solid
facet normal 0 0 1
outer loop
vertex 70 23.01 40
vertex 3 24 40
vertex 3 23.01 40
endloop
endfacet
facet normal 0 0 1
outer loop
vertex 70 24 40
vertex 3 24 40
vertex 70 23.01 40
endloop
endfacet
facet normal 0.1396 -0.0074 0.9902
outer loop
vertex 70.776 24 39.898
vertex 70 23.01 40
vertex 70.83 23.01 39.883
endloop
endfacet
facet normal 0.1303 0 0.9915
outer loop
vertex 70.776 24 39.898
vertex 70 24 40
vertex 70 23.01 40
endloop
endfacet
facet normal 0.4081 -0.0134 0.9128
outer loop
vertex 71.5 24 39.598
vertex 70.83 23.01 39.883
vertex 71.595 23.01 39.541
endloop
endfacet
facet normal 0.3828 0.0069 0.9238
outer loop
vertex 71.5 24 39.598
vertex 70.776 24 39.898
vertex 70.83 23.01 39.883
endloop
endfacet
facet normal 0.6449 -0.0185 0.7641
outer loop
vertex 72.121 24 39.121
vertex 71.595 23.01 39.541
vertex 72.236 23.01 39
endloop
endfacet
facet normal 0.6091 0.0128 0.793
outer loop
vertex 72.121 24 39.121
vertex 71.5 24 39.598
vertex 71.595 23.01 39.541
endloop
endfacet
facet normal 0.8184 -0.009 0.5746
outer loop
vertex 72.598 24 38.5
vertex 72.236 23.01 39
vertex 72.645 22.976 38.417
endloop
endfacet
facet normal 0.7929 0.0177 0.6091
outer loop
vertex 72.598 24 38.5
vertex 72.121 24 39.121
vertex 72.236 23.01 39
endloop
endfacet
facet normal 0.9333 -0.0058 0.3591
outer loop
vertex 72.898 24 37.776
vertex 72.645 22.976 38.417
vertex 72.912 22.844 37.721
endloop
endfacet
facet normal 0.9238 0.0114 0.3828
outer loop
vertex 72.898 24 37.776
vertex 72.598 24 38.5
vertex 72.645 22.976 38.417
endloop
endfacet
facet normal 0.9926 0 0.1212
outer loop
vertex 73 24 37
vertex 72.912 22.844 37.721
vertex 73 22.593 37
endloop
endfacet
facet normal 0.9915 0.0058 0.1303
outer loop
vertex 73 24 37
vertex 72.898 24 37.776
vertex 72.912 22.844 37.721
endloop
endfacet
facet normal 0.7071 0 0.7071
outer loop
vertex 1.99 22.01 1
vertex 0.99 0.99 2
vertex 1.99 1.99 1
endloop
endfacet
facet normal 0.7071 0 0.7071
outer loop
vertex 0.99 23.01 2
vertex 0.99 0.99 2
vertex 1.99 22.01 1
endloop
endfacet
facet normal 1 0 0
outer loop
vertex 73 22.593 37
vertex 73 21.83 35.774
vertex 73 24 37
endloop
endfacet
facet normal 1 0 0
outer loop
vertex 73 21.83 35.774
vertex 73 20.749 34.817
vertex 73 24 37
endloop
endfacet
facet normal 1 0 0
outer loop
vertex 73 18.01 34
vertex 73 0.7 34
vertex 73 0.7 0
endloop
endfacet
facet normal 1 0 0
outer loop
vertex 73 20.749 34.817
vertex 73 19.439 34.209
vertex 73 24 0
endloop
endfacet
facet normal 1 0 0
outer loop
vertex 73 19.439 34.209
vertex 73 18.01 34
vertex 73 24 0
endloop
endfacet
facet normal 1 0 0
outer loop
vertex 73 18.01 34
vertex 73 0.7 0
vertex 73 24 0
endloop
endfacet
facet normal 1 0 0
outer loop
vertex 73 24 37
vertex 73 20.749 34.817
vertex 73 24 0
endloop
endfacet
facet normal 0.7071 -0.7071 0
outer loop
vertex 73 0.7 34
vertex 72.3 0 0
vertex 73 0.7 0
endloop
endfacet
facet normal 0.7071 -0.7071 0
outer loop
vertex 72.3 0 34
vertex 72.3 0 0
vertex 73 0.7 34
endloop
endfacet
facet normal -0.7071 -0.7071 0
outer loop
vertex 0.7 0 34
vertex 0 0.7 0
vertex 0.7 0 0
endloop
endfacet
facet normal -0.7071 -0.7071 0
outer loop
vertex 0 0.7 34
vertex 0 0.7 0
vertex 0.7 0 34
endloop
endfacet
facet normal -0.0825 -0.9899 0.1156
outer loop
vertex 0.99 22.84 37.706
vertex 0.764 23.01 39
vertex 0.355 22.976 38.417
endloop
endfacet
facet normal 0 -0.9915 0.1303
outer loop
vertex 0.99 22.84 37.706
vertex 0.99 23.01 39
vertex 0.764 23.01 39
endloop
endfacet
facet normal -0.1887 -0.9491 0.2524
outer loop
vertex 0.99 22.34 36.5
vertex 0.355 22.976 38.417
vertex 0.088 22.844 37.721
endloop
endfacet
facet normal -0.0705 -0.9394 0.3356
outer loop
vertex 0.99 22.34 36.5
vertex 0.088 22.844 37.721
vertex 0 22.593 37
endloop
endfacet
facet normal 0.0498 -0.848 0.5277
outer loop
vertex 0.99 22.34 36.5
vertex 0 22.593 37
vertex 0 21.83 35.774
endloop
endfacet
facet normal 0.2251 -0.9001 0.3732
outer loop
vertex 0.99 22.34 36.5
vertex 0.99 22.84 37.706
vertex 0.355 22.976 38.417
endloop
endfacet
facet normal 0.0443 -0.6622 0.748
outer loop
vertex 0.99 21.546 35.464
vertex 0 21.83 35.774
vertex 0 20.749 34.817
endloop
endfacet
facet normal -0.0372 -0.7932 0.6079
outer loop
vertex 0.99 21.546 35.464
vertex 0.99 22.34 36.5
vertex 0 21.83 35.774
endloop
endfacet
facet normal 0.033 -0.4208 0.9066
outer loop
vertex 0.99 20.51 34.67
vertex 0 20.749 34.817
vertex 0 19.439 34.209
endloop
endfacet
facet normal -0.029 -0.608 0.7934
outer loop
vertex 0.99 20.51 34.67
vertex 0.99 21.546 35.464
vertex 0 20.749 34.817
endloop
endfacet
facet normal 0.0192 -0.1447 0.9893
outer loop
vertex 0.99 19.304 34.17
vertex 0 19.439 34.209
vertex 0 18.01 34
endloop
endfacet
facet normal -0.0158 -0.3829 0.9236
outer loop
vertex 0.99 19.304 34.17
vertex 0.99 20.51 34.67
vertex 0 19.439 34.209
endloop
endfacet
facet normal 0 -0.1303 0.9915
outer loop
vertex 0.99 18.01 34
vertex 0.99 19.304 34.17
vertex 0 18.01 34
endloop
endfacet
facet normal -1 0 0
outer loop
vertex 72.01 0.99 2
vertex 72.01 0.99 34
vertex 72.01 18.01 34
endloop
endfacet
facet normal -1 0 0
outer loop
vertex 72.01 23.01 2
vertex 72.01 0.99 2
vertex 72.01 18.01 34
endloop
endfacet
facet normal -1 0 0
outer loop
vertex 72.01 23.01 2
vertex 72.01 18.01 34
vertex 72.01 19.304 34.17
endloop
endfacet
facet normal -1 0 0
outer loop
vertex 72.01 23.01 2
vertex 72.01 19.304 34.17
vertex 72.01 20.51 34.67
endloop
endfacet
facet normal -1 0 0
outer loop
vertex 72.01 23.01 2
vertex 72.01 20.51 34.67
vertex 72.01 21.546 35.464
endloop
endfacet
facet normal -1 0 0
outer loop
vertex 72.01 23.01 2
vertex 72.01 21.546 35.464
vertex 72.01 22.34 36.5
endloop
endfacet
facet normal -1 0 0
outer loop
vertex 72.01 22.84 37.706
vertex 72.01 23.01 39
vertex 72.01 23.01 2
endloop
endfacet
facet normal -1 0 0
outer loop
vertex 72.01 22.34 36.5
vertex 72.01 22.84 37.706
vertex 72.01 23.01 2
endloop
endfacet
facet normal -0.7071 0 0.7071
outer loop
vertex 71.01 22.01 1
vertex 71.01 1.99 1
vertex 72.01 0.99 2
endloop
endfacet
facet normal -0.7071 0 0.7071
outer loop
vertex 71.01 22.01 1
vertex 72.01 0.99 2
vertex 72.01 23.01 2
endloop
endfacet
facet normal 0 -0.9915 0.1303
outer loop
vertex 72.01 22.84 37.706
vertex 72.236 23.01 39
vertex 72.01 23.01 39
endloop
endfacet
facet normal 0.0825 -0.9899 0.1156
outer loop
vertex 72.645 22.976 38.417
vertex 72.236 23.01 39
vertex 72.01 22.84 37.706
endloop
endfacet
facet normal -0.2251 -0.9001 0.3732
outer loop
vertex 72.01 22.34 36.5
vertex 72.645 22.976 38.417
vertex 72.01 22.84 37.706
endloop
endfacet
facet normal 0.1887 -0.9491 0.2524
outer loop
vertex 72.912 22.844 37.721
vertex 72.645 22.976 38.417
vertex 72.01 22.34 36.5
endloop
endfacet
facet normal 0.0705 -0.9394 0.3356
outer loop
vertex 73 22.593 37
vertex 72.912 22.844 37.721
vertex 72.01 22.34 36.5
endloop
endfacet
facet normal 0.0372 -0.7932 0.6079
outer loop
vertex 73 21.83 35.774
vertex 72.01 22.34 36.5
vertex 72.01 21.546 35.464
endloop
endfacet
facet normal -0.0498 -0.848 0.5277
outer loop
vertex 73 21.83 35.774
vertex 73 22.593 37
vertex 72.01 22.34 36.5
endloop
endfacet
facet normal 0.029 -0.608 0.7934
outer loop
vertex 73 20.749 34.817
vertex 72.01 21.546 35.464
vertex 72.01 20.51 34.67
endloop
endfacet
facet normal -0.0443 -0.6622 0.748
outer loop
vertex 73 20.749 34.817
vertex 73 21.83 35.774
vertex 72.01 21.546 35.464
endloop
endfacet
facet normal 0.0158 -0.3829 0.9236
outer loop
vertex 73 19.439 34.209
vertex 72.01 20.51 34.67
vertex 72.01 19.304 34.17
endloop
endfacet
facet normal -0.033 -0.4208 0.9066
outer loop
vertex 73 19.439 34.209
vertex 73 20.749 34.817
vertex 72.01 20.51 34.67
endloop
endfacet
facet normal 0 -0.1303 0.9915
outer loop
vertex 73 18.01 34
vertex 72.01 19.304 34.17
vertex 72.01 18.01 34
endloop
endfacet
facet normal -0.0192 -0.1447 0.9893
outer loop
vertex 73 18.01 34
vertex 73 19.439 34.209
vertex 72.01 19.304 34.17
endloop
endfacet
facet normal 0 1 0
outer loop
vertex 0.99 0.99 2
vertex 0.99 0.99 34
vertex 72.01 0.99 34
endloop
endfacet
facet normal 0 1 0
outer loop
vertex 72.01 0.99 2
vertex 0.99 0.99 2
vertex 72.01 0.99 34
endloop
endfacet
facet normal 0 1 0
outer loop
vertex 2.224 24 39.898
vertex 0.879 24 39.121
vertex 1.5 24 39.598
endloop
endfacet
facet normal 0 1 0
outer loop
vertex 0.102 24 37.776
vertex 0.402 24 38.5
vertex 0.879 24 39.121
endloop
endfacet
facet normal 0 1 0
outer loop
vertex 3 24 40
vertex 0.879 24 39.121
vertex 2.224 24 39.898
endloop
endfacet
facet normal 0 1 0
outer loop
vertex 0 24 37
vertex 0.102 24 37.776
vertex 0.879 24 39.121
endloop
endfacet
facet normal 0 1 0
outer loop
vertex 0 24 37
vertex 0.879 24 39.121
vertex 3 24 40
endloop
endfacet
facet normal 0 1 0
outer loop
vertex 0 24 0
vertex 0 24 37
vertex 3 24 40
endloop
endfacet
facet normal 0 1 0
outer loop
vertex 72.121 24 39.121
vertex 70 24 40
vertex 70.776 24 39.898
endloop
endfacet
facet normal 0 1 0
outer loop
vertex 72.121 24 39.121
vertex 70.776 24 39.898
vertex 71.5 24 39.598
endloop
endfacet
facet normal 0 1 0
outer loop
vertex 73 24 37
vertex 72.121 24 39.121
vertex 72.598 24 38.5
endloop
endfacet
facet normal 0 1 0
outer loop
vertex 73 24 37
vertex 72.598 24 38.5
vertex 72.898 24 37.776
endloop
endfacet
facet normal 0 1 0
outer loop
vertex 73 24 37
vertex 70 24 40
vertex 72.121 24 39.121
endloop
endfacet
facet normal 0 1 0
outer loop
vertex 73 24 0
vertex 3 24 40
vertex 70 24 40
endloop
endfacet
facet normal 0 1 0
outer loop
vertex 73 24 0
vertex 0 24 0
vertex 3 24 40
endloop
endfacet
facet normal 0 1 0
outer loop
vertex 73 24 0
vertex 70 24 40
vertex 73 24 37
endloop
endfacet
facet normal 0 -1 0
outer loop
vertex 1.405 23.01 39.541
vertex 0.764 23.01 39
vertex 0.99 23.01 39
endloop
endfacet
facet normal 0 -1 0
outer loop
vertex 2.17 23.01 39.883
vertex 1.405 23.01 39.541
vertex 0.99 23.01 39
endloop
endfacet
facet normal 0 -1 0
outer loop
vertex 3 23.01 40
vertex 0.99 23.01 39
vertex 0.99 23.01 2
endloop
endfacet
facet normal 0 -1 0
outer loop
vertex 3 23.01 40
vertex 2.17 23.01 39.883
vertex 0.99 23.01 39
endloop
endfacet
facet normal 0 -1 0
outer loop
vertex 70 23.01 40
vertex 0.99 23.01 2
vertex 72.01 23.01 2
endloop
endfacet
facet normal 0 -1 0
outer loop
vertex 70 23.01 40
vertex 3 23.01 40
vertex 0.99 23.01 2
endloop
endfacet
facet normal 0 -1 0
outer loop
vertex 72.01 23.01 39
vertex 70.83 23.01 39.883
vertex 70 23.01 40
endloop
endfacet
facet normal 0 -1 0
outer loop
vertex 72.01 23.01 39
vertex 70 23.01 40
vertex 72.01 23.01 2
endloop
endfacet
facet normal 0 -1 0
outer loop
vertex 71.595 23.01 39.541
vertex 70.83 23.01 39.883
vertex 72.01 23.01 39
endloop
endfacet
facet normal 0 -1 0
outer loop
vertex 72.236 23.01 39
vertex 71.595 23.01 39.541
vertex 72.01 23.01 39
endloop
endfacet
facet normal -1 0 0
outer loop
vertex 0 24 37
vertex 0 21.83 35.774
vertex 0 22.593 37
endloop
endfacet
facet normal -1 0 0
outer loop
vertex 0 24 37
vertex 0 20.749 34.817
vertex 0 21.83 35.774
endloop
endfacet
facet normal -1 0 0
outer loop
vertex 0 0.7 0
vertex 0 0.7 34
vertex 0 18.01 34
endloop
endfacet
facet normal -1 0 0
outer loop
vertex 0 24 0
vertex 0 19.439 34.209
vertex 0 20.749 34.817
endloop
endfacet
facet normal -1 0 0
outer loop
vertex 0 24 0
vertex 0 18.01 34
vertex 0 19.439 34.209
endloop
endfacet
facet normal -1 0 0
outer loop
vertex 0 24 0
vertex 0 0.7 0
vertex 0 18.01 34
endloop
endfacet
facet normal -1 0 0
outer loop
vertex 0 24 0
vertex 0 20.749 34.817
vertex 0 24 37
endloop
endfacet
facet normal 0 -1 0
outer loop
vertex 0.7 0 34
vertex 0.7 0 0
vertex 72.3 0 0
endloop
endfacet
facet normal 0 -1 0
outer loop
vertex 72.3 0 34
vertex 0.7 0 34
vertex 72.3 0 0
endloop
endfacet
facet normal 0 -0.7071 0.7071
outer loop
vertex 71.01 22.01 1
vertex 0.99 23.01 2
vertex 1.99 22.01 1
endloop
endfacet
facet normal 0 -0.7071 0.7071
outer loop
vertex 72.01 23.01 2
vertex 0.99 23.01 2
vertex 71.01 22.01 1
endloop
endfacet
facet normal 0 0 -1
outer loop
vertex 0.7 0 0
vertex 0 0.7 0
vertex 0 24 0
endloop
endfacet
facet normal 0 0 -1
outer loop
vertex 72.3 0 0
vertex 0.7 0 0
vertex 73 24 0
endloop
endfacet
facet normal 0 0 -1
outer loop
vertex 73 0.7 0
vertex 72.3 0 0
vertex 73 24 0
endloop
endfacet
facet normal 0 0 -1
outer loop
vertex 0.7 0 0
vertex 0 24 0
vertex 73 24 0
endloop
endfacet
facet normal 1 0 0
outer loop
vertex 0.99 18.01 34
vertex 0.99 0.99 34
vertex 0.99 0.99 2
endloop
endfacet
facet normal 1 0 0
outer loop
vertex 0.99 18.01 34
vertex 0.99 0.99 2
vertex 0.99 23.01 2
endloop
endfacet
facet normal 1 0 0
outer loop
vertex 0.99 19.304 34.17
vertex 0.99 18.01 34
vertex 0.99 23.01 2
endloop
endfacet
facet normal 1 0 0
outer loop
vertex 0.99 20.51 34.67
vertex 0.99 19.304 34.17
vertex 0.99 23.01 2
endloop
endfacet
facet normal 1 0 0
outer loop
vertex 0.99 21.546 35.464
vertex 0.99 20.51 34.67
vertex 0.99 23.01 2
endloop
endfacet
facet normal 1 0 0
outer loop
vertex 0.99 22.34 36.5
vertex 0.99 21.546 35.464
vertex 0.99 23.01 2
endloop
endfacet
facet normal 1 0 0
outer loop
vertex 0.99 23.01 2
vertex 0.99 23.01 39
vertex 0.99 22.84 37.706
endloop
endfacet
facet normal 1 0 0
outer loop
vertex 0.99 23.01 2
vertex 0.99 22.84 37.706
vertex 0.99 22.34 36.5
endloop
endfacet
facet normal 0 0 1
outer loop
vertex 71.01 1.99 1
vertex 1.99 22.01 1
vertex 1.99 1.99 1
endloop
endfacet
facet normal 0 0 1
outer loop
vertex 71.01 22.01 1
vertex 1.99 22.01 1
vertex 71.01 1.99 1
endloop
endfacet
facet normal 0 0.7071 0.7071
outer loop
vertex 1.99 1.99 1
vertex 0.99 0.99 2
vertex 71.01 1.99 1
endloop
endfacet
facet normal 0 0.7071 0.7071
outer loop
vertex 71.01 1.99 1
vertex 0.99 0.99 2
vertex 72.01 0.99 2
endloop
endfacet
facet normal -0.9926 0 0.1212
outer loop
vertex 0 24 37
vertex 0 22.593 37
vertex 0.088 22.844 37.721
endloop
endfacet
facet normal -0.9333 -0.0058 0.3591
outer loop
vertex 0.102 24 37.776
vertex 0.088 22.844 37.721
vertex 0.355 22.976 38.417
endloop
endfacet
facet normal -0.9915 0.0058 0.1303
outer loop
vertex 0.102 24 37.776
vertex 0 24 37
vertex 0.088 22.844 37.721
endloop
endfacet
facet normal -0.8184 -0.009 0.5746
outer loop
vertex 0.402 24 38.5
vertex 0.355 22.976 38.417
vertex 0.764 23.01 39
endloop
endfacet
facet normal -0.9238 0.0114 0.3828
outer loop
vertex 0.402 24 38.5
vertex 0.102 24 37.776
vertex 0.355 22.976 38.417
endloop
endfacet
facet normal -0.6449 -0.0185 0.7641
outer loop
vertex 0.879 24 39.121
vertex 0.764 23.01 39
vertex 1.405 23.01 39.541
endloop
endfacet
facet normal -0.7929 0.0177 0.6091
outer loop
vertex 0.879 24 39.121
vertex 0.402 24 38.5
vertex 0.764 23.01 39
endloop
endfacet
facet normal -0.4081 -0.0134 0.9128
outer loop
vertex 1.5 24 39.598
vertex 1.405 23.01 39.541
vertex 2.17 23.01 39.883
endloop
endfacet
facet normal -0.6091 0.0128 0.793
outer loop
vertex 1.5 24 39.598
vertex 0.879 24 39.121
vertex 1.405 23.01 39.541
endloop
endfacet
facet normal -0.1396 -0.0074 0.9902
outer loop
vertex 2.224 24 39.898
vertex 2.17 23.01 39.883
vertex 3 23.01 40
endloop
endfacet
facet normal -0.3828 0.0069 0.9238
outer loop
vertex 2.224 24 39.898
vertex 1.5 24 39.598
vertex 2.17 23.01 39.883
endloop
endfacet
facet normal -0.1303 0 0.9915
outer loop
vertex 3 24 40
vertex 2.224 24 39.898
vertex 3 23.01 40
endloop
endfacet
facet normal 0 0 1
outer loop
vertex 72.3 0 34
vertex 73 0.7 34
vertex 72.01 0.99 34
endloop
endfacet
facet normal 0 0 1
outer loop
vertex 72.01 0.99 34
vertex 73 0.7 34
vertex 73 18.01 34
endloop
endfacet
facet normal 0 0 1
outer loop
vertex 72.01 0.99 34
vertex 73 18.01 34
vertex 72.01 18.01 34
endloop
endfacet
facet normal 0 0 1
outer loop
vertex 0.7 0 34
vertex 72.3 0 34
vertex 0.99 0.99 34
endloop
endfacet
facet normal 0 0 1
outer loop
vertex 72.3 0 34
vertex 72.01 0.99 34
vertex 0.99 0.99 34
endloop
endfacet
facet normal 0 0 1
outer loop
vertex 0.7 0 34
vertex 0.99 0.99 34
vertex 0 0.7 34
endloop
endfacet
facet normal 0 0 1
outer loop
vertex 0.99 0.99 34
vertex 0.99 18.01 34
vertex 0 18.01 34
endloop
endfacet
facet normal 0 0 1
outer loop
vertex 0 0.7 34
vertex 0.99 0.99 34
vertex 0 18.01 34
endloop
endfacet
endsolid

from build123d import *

# Parameters (mm, degrees)
SKETCH_W        = 73
SKETCH_H        = 24
PAD_DEPTH       = 40
SKETCH001_W     = 71.020102
SKETCH001_H     = 22.020102
POCKET_DEPTH    = 39
POCKET001_DEPTH = 6
CHAMFER_SIZE    = 1
FILLET_R        = 3
FILLET001_R     = 5
CHAMFER001_SIZE = 0.7


with BuildPart() as part:
    # Sketch → Pad (new body)
    with BuildSketch(Plane.XY):
        with Locations((36.5, 12)):
            Rectangle(SKETCH_W, SKETCH_H)
    extrude(amount=PAD_DEPTH)

    # Sketch001 (on Face6 of Pad) → Pocket (cut)
    with BuildSketch(Plane.XY.offset(40)):
        with Locations((36.5, 12)):
            Rectangle(SKETCH001_W, SKETCH001_H)
    extrude(amount=-POCKET_DEPTH, mode=Mode.SUBTRACT)

    # Sketch002 (on Face5 of Pocket) → Pocket001 (cut)
    with BuildSketch(Plane.XY.offset(40)):
        Polygon((0, 23.010051), (0.989949, 23.010051), (0.989949, 0.989949), (72.010051, 0.989949), (72.010051, 23.010051), (73, 23.010051), (73, 0), (0, 0), align=None)
    extrude(amount=-POCKET001_DEPTH, mode=Mode.SUBTRACT)

    # Chamfer
    chamfer_edges = [part.edges().sort_by_distance(p)[0] for p in [
        (36.5, 23.010051, 1),
        (72.010051, 12, 1),
        (36.5, 0.989949, 1),
        (0.989949, 12, 1),
    ]]
    chamfer(chamfer_edges, length=CHAMFER_SIZE)

    # Fillet
    fillet_edges = [part.edges().sort_by_distance(p)[0] for p in [
        (0, 23.505025, 40),
        (73, 23.505025, 40),
    ]]
    fillet(fillet_edges, radius=FILLET_R)

    # Fillet001
    fillet001_edges = [part.edges().sort_by_distance(p)[0] for p in [
        (0.494975, 23.010051, 34),
        (72.505025, 23.010051, 34),
    ]]
    fillet(fillet001_edges, radius=FILLET001_R)

    # Chamfer001
    chamfer001_edges = [part.edges().sort_by_distance(p)[0] for p in [
        (0, 0, 17),
        (73, 0, 17),
    ]]
    chamfer(chamfer001_edges, length=CHAMFER001_SIZE)


solid = part.part
